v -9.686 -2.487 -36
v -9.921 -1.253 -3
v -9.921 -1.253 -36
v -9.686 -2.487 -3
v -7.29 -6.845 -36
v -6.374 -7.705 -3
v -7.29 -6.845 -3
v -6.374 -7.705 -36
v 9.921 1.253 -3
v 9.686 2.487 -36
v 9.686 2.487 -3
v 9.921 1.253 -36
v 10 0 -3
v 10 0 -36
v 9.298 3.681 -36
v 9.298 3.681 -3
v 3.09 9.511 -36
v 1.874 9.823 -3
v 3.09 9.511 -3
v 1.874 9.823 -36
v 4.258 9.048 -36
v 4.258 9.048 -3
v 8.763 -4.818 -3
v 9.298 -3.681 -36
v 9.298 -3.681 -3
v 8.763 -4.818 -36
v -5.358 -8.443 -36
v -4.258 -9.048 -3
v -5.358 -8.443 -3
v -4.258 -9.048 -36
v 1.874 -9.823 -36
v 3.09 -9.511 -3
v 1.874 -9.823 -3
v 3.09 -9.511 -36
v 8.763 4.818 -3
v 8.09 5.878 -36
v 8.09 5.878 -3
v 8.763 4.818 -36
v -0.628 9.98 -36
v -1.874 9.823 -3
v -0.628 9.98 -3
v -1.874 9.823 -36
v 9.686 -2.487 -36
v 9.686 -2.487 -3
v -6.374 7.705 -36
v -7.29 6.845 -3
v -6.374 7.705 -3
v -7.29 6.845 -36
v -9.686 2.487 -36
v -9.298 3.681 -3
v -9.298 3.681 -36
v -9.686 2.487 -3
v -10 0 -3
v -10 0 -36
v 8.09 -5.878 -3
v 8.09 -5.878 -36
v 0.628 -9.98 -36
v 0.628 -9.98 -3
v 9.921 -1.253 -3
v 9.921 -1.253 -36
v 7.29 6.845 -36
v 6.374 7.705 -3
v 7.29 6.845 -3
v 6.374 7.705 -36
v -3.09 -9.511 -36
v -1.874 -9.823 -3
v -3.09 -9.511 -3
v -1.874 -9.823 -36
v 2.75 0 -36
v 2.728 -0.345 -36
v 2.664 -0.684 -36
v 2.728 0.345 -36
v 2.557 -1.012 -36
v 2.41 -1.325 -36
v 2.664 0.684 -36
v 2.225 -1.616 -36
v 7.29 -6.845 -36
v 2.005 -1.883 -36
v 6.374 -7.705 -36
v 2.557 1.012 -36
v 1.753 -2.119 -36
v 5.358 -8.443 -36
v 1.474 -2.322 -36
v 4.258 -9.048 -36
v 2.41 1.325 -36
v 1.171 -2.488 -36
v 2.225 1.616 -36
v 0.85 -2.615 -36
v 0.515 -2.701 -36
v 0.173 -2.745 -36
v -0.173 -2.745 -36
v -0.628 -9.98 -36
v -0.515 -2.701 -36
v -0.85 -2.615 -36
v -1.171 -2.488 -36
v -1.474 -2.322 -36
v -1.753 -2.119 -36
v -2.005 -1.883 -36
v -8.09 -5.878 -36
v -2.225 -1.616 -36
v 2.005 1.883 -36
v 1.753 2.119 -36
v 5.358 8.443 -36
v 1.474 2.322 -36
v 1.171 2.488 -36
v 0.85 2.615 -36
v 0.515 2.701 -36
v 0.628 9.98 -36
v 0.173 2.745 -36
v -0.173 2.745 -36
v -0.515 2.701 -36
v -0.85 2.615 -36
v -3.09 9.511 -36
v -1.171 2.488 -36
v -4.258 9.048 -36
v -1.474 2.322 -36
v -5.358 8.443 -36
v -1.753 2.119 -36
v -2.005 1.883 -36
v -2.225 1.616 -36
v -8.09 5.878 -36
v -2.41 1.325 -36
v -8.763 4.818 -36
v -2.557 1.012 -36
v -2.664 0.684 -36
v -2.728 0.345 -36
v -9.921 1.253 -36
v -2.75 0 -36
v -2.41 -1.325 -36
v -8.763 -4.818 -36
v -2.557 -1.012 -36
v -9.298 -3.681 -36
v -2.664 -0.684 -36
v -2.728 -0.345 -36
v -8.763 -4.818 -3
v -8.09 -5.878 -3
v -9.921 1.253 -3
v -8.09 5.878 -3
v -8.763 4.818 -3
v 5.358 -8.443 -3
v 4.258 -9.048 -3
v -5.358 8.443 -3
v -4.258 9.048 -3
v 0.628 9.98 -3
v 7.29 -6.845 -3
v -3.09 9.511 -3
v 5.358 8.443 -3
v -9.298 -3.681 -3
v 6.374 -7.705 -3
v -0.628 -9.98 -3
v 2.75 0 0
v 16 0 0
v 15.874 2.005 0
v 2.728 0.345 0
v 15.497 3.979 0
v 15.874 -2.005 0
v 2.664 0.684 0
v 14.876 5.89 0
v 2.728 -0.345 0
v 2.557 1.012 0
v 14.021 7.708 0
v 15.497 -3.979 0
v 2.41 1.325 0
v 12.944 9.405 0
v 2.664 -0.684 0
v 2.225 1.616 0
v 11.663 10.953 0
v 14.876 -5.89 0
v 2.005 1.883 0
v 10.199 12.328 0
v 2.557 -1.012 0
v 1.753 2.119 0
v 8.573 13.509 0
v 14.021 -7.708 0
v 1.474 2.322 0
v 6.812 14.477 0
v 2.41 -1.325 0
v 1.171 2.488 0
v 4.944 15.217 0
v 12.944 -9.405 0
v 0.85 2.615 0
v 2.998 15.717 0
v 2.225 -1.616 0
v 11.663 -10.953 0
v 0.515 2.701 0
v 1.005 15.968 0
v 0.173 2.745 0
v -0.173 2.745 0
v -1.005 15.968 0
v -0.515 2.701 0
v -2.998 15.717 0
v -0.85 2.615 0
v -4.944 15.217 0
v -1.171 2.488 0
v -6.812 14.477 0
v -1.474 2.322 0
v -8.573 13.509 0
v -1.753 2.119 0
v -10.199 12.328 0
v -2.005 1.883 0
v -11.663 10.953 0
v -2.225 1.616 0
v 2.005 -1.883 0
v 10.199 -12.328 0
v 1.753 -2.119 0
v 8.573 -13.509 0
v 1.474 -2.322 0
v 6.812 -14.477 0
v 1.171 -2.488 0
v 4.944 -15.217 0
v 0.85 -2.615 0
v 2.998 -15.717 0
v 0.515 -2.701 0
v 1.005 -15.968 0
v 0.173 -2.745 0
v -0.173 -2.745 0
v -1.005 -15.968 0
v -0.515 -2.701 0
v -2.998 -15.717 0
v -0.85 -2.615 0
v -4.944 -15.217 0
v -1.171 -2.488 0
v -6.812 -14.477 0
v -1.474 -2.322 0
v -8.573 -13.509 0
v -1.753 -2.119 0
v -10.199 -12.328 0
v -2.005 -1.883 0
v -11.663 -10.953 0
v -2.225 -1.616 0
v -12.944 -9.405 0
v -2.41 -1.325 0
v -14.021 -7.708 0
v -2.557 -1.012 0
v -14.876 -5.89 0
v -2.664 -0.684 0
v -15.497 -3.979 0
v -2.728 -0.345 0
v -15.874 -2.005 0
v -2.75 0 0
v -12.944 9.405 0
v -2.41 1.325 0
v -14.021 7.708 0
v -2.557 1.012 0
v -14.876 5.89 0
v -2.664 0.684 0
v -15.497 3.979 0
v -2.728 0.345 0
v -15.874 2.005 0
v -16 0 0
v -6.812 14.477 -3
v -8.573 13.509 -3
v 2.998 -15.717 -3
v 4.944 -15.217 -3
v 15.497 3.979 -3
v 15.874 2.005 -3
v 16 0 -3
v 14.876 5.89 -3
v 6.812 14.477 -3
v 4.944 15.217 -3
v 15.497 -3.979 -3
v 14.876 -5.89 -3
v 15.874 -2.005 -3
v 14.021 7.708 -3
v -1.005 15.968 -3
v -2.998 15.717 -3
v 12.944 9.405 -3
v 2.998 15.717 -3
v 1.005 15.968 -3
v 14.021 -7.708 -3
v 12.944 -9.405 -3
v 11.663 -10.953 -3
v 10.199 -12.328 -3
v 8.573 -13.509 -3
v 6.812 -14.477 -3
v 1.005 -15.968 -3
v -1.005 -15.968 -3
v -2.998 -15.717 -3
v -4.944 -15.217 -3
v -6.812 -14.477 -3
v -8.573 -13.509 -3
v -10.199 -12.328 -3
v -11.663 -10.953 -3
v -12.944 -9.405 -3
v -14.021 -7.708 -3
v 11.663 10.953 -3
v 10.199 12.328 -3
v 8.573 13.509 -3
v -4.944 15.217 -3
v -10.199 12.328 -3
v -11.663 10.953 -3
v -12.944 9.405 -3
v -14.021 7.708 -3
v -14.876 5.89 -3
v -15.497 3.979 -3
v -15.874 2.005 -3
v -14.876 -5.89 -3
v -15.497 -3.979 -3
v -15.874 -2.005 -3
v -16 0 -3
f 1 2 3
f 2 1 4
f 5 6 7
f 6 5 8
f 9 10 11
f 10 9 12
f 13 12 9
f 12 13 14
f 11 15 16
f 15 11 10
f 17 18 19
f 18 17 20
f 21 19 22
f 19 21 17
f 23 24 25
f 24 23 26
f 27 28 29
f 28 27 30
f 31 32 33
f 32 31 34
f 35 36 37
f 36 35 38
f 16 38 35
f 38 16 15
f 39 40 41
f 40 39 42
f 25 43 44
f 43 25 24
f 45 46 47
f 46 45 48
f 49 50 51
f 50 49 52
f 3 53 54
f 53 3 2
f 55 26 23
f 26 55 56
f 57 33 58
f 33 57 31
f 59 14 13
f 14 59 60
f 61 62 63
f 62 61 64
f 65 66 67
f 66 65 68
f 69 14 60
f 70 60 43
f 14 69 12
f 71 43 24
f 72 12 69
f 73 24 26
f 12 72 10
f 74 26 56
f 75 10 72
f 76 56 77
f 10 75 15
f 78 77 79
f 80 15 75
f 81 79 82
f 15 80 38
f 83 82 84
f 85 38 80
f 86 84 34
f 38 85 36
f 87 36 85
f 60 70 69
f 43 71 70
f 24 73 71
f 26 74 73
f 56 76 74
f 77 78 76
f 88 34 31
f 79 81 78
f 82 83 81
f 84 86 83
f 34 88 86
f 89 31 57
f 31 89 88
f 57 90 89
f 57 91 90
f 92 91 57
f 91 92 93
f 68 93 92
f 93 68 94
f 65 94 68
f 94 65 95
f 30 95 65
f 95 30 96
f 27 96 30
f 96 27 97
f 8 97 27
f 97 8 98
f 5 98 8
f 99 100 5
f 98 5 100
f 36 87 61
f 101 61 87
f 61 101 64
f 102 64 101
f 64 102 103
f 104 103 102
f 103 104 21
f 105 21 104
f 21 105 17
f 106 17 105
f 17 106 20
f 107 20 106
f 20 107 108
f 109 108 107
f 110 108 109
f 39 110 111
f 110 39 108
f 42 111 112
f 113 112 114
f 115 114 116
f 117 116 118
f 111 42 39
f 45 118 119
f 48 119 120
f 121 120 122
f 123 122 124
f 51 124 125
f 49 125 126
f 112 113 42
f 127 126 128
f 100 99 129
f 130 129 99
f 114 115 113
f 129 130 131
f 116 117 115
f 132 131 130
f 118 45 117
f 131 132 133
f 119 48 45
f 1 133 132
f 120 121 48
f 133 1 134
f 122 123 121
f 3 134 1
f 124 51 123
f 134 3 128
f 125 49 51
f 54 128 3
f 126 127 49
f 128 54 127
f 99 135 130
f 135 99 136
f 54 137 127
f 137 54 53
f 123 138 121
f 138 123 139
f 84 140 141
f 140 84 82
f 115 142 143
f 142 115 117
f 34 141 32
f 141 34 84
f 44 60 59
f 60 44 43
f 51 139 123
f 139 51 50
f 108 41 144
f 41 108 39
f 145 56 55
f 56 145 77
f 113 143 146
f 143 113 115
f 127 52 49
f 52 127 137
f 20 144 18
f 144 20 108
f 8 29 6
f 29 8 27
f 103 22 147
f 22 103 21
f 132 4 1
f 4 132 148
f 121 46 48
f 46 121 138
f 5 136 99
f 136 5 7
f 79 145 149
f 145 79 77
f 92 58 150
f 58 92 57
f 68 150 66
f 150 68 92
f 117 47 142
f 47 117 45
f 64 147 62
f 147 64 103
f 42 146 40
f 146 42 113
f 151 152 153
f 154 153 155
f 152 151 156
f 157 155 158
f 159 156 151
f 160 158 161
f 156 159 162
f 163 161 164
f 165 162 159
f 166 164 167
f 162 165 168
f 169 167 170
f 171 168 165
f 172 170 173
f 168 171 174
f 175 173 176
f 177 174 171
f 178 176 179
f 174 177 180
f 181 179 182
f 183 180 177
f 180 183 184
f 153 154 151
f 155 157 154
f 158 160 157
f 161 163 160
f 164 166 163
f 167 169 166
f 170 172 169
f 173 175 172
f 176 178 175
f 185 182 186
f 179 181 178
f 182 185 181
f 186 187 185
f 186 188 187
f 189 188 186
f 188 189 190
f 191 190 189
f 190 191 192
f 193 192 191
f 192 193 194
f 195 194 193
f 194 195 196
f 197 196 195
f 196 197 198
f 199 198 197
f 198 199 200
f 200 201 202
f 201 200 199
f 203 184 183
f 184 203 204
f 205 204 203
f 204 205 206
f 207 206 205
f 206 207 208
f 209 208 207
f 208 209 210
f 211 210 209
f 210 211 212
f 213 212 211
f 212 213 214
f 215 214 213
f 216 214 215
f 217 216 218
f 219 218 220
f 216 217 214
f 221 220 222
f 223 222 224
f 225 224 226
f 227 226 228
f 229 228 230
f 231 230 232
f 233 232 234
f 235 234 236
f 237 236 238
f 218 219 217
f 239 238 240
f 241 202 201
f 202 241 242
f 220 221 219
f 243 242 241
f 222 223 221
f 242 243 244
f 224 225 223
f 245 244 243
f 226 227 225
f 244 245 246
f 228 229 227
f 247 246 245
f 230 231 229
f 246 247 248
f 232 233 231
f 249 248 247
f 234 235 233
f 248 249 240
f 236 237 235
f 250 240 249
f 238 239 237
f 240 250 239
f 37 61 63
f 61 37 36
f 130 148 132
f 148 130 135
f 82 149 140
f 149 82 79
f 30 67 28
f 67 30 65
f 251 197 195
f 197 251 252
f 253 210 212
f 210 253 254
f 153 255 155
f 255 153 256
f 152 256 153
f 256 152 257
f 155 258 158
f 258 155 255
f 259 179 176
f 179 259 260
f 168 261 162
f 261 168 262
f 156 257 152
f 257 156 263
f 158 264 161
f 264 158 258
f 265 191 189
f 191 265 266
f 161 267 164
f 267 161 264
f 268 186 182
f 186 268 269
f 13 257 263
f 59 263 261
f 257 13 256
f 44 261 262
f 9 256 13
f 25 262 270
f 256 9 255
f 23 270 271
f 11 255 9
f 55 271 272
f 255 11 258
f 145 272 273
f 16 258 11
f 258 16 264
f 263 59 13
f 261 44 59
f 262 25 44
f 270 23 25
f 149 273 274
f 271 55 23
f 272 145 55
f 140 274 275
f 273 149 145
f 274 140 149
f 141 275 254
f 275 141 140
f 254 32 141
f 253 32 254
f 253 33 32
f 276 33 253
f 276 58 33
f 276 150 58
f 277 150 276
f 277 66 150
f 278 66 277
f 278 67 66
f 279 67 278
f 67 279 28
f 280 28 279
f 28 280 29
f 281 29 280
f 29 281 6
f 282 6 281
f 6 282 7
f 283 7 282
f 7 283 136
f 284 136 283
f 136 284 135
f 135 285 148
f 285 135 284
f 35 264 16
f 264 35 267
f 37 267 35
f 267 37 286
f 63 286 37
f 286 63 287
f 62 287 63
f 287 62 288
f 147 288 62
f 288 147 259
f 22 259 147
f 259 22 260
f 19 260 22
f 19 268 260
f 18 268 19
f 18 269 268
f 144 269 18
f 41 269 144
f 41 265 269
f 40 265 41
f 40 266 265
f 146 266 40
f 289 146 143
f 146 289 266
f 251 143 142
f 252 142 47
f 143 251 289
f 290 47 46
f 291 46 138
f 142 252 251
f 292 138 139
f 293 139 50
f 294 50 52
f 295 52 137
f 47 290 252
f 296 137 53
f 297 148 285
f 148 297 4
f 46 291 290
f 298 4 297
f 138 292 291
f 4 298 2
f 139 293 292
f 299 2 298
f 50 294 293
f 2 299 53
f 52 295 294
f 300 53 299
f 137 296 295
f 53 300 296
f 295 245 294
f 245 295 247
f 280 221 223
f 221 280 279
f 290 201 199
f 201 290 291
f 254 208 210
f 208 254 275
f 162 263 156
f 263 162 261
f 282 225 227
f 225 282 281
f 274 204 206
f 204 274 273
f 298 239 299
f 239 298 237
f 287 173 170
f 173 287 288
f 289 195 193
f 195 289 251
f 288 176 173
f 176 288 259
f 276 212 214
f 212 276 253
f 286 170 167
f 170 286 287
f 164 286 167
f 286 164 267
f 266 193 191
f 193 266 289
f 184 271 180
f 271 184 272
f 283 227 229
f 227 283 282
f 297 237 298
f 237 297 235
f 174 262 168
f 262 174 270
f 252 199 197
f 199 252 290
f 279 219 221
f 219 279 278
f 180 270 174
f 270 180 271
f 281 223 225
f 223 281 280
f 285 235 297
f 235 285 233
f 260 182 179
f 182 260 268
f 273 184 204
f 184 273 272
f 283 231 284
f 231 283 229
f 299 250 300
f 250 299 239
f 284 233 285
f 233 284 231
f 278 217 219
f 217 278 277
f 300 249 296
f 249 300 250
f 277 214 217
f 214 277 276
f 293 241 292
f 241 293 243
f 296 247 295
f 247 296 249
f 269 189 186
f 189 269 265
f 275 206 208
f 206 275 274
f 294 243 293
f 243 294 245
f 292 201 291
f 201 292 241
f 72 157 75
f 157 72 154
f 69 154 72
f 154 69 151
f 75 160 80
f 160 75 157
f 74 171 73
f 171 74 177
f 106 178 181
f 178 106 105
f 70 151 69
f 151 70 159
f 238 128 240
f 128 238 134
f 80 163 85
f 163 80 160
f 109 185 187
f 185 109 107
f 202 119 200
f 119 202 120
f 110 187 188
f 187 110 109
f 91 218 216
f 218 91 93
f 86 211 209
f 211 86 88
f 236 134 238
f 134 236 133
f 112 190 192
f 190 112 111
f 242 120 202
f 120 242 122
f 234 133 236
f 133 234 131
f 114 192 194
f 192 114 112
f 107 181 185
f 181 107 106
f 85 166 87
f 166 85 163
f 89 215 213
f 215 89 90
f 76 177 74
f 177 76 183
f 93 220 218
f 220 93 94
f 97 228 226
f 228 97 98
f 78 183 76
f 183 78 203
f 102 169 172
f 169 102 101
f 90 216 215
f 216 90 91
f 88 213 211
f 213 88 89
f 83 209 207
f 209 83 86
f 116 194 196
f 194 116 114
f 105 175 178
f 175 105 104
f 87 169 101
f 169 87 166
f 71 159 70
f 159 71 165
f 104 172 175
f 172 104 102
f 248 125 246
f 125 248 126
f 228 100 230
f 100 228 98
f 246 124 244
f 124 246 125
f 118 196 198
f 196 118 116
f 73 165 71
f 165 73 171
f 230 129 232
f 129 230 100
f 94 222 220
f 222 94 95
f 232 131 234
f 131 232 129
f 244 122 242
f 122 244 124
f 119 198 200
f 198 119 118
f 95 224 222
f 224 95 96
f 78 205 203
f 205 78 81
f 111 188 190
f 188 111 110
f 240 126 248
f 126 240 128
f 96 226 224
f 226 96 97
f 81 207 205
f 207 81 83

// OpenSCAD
$fn = 50;


difference() {
	union() {
		translate(v = [0, 0, -36.0000000000]) {
			cylinder(h = 36, r = 10.0000000000);
		}
		translate(v = [0, 0, -3.0000000000]) {
			cylinder(h = 3, r = 16.0000000000);
		}
	}
	union() {
		#translate(v = [0, 0, -36]) {
			cylinder(h = 36, r = 2.7500000000);
		}
	}
}
